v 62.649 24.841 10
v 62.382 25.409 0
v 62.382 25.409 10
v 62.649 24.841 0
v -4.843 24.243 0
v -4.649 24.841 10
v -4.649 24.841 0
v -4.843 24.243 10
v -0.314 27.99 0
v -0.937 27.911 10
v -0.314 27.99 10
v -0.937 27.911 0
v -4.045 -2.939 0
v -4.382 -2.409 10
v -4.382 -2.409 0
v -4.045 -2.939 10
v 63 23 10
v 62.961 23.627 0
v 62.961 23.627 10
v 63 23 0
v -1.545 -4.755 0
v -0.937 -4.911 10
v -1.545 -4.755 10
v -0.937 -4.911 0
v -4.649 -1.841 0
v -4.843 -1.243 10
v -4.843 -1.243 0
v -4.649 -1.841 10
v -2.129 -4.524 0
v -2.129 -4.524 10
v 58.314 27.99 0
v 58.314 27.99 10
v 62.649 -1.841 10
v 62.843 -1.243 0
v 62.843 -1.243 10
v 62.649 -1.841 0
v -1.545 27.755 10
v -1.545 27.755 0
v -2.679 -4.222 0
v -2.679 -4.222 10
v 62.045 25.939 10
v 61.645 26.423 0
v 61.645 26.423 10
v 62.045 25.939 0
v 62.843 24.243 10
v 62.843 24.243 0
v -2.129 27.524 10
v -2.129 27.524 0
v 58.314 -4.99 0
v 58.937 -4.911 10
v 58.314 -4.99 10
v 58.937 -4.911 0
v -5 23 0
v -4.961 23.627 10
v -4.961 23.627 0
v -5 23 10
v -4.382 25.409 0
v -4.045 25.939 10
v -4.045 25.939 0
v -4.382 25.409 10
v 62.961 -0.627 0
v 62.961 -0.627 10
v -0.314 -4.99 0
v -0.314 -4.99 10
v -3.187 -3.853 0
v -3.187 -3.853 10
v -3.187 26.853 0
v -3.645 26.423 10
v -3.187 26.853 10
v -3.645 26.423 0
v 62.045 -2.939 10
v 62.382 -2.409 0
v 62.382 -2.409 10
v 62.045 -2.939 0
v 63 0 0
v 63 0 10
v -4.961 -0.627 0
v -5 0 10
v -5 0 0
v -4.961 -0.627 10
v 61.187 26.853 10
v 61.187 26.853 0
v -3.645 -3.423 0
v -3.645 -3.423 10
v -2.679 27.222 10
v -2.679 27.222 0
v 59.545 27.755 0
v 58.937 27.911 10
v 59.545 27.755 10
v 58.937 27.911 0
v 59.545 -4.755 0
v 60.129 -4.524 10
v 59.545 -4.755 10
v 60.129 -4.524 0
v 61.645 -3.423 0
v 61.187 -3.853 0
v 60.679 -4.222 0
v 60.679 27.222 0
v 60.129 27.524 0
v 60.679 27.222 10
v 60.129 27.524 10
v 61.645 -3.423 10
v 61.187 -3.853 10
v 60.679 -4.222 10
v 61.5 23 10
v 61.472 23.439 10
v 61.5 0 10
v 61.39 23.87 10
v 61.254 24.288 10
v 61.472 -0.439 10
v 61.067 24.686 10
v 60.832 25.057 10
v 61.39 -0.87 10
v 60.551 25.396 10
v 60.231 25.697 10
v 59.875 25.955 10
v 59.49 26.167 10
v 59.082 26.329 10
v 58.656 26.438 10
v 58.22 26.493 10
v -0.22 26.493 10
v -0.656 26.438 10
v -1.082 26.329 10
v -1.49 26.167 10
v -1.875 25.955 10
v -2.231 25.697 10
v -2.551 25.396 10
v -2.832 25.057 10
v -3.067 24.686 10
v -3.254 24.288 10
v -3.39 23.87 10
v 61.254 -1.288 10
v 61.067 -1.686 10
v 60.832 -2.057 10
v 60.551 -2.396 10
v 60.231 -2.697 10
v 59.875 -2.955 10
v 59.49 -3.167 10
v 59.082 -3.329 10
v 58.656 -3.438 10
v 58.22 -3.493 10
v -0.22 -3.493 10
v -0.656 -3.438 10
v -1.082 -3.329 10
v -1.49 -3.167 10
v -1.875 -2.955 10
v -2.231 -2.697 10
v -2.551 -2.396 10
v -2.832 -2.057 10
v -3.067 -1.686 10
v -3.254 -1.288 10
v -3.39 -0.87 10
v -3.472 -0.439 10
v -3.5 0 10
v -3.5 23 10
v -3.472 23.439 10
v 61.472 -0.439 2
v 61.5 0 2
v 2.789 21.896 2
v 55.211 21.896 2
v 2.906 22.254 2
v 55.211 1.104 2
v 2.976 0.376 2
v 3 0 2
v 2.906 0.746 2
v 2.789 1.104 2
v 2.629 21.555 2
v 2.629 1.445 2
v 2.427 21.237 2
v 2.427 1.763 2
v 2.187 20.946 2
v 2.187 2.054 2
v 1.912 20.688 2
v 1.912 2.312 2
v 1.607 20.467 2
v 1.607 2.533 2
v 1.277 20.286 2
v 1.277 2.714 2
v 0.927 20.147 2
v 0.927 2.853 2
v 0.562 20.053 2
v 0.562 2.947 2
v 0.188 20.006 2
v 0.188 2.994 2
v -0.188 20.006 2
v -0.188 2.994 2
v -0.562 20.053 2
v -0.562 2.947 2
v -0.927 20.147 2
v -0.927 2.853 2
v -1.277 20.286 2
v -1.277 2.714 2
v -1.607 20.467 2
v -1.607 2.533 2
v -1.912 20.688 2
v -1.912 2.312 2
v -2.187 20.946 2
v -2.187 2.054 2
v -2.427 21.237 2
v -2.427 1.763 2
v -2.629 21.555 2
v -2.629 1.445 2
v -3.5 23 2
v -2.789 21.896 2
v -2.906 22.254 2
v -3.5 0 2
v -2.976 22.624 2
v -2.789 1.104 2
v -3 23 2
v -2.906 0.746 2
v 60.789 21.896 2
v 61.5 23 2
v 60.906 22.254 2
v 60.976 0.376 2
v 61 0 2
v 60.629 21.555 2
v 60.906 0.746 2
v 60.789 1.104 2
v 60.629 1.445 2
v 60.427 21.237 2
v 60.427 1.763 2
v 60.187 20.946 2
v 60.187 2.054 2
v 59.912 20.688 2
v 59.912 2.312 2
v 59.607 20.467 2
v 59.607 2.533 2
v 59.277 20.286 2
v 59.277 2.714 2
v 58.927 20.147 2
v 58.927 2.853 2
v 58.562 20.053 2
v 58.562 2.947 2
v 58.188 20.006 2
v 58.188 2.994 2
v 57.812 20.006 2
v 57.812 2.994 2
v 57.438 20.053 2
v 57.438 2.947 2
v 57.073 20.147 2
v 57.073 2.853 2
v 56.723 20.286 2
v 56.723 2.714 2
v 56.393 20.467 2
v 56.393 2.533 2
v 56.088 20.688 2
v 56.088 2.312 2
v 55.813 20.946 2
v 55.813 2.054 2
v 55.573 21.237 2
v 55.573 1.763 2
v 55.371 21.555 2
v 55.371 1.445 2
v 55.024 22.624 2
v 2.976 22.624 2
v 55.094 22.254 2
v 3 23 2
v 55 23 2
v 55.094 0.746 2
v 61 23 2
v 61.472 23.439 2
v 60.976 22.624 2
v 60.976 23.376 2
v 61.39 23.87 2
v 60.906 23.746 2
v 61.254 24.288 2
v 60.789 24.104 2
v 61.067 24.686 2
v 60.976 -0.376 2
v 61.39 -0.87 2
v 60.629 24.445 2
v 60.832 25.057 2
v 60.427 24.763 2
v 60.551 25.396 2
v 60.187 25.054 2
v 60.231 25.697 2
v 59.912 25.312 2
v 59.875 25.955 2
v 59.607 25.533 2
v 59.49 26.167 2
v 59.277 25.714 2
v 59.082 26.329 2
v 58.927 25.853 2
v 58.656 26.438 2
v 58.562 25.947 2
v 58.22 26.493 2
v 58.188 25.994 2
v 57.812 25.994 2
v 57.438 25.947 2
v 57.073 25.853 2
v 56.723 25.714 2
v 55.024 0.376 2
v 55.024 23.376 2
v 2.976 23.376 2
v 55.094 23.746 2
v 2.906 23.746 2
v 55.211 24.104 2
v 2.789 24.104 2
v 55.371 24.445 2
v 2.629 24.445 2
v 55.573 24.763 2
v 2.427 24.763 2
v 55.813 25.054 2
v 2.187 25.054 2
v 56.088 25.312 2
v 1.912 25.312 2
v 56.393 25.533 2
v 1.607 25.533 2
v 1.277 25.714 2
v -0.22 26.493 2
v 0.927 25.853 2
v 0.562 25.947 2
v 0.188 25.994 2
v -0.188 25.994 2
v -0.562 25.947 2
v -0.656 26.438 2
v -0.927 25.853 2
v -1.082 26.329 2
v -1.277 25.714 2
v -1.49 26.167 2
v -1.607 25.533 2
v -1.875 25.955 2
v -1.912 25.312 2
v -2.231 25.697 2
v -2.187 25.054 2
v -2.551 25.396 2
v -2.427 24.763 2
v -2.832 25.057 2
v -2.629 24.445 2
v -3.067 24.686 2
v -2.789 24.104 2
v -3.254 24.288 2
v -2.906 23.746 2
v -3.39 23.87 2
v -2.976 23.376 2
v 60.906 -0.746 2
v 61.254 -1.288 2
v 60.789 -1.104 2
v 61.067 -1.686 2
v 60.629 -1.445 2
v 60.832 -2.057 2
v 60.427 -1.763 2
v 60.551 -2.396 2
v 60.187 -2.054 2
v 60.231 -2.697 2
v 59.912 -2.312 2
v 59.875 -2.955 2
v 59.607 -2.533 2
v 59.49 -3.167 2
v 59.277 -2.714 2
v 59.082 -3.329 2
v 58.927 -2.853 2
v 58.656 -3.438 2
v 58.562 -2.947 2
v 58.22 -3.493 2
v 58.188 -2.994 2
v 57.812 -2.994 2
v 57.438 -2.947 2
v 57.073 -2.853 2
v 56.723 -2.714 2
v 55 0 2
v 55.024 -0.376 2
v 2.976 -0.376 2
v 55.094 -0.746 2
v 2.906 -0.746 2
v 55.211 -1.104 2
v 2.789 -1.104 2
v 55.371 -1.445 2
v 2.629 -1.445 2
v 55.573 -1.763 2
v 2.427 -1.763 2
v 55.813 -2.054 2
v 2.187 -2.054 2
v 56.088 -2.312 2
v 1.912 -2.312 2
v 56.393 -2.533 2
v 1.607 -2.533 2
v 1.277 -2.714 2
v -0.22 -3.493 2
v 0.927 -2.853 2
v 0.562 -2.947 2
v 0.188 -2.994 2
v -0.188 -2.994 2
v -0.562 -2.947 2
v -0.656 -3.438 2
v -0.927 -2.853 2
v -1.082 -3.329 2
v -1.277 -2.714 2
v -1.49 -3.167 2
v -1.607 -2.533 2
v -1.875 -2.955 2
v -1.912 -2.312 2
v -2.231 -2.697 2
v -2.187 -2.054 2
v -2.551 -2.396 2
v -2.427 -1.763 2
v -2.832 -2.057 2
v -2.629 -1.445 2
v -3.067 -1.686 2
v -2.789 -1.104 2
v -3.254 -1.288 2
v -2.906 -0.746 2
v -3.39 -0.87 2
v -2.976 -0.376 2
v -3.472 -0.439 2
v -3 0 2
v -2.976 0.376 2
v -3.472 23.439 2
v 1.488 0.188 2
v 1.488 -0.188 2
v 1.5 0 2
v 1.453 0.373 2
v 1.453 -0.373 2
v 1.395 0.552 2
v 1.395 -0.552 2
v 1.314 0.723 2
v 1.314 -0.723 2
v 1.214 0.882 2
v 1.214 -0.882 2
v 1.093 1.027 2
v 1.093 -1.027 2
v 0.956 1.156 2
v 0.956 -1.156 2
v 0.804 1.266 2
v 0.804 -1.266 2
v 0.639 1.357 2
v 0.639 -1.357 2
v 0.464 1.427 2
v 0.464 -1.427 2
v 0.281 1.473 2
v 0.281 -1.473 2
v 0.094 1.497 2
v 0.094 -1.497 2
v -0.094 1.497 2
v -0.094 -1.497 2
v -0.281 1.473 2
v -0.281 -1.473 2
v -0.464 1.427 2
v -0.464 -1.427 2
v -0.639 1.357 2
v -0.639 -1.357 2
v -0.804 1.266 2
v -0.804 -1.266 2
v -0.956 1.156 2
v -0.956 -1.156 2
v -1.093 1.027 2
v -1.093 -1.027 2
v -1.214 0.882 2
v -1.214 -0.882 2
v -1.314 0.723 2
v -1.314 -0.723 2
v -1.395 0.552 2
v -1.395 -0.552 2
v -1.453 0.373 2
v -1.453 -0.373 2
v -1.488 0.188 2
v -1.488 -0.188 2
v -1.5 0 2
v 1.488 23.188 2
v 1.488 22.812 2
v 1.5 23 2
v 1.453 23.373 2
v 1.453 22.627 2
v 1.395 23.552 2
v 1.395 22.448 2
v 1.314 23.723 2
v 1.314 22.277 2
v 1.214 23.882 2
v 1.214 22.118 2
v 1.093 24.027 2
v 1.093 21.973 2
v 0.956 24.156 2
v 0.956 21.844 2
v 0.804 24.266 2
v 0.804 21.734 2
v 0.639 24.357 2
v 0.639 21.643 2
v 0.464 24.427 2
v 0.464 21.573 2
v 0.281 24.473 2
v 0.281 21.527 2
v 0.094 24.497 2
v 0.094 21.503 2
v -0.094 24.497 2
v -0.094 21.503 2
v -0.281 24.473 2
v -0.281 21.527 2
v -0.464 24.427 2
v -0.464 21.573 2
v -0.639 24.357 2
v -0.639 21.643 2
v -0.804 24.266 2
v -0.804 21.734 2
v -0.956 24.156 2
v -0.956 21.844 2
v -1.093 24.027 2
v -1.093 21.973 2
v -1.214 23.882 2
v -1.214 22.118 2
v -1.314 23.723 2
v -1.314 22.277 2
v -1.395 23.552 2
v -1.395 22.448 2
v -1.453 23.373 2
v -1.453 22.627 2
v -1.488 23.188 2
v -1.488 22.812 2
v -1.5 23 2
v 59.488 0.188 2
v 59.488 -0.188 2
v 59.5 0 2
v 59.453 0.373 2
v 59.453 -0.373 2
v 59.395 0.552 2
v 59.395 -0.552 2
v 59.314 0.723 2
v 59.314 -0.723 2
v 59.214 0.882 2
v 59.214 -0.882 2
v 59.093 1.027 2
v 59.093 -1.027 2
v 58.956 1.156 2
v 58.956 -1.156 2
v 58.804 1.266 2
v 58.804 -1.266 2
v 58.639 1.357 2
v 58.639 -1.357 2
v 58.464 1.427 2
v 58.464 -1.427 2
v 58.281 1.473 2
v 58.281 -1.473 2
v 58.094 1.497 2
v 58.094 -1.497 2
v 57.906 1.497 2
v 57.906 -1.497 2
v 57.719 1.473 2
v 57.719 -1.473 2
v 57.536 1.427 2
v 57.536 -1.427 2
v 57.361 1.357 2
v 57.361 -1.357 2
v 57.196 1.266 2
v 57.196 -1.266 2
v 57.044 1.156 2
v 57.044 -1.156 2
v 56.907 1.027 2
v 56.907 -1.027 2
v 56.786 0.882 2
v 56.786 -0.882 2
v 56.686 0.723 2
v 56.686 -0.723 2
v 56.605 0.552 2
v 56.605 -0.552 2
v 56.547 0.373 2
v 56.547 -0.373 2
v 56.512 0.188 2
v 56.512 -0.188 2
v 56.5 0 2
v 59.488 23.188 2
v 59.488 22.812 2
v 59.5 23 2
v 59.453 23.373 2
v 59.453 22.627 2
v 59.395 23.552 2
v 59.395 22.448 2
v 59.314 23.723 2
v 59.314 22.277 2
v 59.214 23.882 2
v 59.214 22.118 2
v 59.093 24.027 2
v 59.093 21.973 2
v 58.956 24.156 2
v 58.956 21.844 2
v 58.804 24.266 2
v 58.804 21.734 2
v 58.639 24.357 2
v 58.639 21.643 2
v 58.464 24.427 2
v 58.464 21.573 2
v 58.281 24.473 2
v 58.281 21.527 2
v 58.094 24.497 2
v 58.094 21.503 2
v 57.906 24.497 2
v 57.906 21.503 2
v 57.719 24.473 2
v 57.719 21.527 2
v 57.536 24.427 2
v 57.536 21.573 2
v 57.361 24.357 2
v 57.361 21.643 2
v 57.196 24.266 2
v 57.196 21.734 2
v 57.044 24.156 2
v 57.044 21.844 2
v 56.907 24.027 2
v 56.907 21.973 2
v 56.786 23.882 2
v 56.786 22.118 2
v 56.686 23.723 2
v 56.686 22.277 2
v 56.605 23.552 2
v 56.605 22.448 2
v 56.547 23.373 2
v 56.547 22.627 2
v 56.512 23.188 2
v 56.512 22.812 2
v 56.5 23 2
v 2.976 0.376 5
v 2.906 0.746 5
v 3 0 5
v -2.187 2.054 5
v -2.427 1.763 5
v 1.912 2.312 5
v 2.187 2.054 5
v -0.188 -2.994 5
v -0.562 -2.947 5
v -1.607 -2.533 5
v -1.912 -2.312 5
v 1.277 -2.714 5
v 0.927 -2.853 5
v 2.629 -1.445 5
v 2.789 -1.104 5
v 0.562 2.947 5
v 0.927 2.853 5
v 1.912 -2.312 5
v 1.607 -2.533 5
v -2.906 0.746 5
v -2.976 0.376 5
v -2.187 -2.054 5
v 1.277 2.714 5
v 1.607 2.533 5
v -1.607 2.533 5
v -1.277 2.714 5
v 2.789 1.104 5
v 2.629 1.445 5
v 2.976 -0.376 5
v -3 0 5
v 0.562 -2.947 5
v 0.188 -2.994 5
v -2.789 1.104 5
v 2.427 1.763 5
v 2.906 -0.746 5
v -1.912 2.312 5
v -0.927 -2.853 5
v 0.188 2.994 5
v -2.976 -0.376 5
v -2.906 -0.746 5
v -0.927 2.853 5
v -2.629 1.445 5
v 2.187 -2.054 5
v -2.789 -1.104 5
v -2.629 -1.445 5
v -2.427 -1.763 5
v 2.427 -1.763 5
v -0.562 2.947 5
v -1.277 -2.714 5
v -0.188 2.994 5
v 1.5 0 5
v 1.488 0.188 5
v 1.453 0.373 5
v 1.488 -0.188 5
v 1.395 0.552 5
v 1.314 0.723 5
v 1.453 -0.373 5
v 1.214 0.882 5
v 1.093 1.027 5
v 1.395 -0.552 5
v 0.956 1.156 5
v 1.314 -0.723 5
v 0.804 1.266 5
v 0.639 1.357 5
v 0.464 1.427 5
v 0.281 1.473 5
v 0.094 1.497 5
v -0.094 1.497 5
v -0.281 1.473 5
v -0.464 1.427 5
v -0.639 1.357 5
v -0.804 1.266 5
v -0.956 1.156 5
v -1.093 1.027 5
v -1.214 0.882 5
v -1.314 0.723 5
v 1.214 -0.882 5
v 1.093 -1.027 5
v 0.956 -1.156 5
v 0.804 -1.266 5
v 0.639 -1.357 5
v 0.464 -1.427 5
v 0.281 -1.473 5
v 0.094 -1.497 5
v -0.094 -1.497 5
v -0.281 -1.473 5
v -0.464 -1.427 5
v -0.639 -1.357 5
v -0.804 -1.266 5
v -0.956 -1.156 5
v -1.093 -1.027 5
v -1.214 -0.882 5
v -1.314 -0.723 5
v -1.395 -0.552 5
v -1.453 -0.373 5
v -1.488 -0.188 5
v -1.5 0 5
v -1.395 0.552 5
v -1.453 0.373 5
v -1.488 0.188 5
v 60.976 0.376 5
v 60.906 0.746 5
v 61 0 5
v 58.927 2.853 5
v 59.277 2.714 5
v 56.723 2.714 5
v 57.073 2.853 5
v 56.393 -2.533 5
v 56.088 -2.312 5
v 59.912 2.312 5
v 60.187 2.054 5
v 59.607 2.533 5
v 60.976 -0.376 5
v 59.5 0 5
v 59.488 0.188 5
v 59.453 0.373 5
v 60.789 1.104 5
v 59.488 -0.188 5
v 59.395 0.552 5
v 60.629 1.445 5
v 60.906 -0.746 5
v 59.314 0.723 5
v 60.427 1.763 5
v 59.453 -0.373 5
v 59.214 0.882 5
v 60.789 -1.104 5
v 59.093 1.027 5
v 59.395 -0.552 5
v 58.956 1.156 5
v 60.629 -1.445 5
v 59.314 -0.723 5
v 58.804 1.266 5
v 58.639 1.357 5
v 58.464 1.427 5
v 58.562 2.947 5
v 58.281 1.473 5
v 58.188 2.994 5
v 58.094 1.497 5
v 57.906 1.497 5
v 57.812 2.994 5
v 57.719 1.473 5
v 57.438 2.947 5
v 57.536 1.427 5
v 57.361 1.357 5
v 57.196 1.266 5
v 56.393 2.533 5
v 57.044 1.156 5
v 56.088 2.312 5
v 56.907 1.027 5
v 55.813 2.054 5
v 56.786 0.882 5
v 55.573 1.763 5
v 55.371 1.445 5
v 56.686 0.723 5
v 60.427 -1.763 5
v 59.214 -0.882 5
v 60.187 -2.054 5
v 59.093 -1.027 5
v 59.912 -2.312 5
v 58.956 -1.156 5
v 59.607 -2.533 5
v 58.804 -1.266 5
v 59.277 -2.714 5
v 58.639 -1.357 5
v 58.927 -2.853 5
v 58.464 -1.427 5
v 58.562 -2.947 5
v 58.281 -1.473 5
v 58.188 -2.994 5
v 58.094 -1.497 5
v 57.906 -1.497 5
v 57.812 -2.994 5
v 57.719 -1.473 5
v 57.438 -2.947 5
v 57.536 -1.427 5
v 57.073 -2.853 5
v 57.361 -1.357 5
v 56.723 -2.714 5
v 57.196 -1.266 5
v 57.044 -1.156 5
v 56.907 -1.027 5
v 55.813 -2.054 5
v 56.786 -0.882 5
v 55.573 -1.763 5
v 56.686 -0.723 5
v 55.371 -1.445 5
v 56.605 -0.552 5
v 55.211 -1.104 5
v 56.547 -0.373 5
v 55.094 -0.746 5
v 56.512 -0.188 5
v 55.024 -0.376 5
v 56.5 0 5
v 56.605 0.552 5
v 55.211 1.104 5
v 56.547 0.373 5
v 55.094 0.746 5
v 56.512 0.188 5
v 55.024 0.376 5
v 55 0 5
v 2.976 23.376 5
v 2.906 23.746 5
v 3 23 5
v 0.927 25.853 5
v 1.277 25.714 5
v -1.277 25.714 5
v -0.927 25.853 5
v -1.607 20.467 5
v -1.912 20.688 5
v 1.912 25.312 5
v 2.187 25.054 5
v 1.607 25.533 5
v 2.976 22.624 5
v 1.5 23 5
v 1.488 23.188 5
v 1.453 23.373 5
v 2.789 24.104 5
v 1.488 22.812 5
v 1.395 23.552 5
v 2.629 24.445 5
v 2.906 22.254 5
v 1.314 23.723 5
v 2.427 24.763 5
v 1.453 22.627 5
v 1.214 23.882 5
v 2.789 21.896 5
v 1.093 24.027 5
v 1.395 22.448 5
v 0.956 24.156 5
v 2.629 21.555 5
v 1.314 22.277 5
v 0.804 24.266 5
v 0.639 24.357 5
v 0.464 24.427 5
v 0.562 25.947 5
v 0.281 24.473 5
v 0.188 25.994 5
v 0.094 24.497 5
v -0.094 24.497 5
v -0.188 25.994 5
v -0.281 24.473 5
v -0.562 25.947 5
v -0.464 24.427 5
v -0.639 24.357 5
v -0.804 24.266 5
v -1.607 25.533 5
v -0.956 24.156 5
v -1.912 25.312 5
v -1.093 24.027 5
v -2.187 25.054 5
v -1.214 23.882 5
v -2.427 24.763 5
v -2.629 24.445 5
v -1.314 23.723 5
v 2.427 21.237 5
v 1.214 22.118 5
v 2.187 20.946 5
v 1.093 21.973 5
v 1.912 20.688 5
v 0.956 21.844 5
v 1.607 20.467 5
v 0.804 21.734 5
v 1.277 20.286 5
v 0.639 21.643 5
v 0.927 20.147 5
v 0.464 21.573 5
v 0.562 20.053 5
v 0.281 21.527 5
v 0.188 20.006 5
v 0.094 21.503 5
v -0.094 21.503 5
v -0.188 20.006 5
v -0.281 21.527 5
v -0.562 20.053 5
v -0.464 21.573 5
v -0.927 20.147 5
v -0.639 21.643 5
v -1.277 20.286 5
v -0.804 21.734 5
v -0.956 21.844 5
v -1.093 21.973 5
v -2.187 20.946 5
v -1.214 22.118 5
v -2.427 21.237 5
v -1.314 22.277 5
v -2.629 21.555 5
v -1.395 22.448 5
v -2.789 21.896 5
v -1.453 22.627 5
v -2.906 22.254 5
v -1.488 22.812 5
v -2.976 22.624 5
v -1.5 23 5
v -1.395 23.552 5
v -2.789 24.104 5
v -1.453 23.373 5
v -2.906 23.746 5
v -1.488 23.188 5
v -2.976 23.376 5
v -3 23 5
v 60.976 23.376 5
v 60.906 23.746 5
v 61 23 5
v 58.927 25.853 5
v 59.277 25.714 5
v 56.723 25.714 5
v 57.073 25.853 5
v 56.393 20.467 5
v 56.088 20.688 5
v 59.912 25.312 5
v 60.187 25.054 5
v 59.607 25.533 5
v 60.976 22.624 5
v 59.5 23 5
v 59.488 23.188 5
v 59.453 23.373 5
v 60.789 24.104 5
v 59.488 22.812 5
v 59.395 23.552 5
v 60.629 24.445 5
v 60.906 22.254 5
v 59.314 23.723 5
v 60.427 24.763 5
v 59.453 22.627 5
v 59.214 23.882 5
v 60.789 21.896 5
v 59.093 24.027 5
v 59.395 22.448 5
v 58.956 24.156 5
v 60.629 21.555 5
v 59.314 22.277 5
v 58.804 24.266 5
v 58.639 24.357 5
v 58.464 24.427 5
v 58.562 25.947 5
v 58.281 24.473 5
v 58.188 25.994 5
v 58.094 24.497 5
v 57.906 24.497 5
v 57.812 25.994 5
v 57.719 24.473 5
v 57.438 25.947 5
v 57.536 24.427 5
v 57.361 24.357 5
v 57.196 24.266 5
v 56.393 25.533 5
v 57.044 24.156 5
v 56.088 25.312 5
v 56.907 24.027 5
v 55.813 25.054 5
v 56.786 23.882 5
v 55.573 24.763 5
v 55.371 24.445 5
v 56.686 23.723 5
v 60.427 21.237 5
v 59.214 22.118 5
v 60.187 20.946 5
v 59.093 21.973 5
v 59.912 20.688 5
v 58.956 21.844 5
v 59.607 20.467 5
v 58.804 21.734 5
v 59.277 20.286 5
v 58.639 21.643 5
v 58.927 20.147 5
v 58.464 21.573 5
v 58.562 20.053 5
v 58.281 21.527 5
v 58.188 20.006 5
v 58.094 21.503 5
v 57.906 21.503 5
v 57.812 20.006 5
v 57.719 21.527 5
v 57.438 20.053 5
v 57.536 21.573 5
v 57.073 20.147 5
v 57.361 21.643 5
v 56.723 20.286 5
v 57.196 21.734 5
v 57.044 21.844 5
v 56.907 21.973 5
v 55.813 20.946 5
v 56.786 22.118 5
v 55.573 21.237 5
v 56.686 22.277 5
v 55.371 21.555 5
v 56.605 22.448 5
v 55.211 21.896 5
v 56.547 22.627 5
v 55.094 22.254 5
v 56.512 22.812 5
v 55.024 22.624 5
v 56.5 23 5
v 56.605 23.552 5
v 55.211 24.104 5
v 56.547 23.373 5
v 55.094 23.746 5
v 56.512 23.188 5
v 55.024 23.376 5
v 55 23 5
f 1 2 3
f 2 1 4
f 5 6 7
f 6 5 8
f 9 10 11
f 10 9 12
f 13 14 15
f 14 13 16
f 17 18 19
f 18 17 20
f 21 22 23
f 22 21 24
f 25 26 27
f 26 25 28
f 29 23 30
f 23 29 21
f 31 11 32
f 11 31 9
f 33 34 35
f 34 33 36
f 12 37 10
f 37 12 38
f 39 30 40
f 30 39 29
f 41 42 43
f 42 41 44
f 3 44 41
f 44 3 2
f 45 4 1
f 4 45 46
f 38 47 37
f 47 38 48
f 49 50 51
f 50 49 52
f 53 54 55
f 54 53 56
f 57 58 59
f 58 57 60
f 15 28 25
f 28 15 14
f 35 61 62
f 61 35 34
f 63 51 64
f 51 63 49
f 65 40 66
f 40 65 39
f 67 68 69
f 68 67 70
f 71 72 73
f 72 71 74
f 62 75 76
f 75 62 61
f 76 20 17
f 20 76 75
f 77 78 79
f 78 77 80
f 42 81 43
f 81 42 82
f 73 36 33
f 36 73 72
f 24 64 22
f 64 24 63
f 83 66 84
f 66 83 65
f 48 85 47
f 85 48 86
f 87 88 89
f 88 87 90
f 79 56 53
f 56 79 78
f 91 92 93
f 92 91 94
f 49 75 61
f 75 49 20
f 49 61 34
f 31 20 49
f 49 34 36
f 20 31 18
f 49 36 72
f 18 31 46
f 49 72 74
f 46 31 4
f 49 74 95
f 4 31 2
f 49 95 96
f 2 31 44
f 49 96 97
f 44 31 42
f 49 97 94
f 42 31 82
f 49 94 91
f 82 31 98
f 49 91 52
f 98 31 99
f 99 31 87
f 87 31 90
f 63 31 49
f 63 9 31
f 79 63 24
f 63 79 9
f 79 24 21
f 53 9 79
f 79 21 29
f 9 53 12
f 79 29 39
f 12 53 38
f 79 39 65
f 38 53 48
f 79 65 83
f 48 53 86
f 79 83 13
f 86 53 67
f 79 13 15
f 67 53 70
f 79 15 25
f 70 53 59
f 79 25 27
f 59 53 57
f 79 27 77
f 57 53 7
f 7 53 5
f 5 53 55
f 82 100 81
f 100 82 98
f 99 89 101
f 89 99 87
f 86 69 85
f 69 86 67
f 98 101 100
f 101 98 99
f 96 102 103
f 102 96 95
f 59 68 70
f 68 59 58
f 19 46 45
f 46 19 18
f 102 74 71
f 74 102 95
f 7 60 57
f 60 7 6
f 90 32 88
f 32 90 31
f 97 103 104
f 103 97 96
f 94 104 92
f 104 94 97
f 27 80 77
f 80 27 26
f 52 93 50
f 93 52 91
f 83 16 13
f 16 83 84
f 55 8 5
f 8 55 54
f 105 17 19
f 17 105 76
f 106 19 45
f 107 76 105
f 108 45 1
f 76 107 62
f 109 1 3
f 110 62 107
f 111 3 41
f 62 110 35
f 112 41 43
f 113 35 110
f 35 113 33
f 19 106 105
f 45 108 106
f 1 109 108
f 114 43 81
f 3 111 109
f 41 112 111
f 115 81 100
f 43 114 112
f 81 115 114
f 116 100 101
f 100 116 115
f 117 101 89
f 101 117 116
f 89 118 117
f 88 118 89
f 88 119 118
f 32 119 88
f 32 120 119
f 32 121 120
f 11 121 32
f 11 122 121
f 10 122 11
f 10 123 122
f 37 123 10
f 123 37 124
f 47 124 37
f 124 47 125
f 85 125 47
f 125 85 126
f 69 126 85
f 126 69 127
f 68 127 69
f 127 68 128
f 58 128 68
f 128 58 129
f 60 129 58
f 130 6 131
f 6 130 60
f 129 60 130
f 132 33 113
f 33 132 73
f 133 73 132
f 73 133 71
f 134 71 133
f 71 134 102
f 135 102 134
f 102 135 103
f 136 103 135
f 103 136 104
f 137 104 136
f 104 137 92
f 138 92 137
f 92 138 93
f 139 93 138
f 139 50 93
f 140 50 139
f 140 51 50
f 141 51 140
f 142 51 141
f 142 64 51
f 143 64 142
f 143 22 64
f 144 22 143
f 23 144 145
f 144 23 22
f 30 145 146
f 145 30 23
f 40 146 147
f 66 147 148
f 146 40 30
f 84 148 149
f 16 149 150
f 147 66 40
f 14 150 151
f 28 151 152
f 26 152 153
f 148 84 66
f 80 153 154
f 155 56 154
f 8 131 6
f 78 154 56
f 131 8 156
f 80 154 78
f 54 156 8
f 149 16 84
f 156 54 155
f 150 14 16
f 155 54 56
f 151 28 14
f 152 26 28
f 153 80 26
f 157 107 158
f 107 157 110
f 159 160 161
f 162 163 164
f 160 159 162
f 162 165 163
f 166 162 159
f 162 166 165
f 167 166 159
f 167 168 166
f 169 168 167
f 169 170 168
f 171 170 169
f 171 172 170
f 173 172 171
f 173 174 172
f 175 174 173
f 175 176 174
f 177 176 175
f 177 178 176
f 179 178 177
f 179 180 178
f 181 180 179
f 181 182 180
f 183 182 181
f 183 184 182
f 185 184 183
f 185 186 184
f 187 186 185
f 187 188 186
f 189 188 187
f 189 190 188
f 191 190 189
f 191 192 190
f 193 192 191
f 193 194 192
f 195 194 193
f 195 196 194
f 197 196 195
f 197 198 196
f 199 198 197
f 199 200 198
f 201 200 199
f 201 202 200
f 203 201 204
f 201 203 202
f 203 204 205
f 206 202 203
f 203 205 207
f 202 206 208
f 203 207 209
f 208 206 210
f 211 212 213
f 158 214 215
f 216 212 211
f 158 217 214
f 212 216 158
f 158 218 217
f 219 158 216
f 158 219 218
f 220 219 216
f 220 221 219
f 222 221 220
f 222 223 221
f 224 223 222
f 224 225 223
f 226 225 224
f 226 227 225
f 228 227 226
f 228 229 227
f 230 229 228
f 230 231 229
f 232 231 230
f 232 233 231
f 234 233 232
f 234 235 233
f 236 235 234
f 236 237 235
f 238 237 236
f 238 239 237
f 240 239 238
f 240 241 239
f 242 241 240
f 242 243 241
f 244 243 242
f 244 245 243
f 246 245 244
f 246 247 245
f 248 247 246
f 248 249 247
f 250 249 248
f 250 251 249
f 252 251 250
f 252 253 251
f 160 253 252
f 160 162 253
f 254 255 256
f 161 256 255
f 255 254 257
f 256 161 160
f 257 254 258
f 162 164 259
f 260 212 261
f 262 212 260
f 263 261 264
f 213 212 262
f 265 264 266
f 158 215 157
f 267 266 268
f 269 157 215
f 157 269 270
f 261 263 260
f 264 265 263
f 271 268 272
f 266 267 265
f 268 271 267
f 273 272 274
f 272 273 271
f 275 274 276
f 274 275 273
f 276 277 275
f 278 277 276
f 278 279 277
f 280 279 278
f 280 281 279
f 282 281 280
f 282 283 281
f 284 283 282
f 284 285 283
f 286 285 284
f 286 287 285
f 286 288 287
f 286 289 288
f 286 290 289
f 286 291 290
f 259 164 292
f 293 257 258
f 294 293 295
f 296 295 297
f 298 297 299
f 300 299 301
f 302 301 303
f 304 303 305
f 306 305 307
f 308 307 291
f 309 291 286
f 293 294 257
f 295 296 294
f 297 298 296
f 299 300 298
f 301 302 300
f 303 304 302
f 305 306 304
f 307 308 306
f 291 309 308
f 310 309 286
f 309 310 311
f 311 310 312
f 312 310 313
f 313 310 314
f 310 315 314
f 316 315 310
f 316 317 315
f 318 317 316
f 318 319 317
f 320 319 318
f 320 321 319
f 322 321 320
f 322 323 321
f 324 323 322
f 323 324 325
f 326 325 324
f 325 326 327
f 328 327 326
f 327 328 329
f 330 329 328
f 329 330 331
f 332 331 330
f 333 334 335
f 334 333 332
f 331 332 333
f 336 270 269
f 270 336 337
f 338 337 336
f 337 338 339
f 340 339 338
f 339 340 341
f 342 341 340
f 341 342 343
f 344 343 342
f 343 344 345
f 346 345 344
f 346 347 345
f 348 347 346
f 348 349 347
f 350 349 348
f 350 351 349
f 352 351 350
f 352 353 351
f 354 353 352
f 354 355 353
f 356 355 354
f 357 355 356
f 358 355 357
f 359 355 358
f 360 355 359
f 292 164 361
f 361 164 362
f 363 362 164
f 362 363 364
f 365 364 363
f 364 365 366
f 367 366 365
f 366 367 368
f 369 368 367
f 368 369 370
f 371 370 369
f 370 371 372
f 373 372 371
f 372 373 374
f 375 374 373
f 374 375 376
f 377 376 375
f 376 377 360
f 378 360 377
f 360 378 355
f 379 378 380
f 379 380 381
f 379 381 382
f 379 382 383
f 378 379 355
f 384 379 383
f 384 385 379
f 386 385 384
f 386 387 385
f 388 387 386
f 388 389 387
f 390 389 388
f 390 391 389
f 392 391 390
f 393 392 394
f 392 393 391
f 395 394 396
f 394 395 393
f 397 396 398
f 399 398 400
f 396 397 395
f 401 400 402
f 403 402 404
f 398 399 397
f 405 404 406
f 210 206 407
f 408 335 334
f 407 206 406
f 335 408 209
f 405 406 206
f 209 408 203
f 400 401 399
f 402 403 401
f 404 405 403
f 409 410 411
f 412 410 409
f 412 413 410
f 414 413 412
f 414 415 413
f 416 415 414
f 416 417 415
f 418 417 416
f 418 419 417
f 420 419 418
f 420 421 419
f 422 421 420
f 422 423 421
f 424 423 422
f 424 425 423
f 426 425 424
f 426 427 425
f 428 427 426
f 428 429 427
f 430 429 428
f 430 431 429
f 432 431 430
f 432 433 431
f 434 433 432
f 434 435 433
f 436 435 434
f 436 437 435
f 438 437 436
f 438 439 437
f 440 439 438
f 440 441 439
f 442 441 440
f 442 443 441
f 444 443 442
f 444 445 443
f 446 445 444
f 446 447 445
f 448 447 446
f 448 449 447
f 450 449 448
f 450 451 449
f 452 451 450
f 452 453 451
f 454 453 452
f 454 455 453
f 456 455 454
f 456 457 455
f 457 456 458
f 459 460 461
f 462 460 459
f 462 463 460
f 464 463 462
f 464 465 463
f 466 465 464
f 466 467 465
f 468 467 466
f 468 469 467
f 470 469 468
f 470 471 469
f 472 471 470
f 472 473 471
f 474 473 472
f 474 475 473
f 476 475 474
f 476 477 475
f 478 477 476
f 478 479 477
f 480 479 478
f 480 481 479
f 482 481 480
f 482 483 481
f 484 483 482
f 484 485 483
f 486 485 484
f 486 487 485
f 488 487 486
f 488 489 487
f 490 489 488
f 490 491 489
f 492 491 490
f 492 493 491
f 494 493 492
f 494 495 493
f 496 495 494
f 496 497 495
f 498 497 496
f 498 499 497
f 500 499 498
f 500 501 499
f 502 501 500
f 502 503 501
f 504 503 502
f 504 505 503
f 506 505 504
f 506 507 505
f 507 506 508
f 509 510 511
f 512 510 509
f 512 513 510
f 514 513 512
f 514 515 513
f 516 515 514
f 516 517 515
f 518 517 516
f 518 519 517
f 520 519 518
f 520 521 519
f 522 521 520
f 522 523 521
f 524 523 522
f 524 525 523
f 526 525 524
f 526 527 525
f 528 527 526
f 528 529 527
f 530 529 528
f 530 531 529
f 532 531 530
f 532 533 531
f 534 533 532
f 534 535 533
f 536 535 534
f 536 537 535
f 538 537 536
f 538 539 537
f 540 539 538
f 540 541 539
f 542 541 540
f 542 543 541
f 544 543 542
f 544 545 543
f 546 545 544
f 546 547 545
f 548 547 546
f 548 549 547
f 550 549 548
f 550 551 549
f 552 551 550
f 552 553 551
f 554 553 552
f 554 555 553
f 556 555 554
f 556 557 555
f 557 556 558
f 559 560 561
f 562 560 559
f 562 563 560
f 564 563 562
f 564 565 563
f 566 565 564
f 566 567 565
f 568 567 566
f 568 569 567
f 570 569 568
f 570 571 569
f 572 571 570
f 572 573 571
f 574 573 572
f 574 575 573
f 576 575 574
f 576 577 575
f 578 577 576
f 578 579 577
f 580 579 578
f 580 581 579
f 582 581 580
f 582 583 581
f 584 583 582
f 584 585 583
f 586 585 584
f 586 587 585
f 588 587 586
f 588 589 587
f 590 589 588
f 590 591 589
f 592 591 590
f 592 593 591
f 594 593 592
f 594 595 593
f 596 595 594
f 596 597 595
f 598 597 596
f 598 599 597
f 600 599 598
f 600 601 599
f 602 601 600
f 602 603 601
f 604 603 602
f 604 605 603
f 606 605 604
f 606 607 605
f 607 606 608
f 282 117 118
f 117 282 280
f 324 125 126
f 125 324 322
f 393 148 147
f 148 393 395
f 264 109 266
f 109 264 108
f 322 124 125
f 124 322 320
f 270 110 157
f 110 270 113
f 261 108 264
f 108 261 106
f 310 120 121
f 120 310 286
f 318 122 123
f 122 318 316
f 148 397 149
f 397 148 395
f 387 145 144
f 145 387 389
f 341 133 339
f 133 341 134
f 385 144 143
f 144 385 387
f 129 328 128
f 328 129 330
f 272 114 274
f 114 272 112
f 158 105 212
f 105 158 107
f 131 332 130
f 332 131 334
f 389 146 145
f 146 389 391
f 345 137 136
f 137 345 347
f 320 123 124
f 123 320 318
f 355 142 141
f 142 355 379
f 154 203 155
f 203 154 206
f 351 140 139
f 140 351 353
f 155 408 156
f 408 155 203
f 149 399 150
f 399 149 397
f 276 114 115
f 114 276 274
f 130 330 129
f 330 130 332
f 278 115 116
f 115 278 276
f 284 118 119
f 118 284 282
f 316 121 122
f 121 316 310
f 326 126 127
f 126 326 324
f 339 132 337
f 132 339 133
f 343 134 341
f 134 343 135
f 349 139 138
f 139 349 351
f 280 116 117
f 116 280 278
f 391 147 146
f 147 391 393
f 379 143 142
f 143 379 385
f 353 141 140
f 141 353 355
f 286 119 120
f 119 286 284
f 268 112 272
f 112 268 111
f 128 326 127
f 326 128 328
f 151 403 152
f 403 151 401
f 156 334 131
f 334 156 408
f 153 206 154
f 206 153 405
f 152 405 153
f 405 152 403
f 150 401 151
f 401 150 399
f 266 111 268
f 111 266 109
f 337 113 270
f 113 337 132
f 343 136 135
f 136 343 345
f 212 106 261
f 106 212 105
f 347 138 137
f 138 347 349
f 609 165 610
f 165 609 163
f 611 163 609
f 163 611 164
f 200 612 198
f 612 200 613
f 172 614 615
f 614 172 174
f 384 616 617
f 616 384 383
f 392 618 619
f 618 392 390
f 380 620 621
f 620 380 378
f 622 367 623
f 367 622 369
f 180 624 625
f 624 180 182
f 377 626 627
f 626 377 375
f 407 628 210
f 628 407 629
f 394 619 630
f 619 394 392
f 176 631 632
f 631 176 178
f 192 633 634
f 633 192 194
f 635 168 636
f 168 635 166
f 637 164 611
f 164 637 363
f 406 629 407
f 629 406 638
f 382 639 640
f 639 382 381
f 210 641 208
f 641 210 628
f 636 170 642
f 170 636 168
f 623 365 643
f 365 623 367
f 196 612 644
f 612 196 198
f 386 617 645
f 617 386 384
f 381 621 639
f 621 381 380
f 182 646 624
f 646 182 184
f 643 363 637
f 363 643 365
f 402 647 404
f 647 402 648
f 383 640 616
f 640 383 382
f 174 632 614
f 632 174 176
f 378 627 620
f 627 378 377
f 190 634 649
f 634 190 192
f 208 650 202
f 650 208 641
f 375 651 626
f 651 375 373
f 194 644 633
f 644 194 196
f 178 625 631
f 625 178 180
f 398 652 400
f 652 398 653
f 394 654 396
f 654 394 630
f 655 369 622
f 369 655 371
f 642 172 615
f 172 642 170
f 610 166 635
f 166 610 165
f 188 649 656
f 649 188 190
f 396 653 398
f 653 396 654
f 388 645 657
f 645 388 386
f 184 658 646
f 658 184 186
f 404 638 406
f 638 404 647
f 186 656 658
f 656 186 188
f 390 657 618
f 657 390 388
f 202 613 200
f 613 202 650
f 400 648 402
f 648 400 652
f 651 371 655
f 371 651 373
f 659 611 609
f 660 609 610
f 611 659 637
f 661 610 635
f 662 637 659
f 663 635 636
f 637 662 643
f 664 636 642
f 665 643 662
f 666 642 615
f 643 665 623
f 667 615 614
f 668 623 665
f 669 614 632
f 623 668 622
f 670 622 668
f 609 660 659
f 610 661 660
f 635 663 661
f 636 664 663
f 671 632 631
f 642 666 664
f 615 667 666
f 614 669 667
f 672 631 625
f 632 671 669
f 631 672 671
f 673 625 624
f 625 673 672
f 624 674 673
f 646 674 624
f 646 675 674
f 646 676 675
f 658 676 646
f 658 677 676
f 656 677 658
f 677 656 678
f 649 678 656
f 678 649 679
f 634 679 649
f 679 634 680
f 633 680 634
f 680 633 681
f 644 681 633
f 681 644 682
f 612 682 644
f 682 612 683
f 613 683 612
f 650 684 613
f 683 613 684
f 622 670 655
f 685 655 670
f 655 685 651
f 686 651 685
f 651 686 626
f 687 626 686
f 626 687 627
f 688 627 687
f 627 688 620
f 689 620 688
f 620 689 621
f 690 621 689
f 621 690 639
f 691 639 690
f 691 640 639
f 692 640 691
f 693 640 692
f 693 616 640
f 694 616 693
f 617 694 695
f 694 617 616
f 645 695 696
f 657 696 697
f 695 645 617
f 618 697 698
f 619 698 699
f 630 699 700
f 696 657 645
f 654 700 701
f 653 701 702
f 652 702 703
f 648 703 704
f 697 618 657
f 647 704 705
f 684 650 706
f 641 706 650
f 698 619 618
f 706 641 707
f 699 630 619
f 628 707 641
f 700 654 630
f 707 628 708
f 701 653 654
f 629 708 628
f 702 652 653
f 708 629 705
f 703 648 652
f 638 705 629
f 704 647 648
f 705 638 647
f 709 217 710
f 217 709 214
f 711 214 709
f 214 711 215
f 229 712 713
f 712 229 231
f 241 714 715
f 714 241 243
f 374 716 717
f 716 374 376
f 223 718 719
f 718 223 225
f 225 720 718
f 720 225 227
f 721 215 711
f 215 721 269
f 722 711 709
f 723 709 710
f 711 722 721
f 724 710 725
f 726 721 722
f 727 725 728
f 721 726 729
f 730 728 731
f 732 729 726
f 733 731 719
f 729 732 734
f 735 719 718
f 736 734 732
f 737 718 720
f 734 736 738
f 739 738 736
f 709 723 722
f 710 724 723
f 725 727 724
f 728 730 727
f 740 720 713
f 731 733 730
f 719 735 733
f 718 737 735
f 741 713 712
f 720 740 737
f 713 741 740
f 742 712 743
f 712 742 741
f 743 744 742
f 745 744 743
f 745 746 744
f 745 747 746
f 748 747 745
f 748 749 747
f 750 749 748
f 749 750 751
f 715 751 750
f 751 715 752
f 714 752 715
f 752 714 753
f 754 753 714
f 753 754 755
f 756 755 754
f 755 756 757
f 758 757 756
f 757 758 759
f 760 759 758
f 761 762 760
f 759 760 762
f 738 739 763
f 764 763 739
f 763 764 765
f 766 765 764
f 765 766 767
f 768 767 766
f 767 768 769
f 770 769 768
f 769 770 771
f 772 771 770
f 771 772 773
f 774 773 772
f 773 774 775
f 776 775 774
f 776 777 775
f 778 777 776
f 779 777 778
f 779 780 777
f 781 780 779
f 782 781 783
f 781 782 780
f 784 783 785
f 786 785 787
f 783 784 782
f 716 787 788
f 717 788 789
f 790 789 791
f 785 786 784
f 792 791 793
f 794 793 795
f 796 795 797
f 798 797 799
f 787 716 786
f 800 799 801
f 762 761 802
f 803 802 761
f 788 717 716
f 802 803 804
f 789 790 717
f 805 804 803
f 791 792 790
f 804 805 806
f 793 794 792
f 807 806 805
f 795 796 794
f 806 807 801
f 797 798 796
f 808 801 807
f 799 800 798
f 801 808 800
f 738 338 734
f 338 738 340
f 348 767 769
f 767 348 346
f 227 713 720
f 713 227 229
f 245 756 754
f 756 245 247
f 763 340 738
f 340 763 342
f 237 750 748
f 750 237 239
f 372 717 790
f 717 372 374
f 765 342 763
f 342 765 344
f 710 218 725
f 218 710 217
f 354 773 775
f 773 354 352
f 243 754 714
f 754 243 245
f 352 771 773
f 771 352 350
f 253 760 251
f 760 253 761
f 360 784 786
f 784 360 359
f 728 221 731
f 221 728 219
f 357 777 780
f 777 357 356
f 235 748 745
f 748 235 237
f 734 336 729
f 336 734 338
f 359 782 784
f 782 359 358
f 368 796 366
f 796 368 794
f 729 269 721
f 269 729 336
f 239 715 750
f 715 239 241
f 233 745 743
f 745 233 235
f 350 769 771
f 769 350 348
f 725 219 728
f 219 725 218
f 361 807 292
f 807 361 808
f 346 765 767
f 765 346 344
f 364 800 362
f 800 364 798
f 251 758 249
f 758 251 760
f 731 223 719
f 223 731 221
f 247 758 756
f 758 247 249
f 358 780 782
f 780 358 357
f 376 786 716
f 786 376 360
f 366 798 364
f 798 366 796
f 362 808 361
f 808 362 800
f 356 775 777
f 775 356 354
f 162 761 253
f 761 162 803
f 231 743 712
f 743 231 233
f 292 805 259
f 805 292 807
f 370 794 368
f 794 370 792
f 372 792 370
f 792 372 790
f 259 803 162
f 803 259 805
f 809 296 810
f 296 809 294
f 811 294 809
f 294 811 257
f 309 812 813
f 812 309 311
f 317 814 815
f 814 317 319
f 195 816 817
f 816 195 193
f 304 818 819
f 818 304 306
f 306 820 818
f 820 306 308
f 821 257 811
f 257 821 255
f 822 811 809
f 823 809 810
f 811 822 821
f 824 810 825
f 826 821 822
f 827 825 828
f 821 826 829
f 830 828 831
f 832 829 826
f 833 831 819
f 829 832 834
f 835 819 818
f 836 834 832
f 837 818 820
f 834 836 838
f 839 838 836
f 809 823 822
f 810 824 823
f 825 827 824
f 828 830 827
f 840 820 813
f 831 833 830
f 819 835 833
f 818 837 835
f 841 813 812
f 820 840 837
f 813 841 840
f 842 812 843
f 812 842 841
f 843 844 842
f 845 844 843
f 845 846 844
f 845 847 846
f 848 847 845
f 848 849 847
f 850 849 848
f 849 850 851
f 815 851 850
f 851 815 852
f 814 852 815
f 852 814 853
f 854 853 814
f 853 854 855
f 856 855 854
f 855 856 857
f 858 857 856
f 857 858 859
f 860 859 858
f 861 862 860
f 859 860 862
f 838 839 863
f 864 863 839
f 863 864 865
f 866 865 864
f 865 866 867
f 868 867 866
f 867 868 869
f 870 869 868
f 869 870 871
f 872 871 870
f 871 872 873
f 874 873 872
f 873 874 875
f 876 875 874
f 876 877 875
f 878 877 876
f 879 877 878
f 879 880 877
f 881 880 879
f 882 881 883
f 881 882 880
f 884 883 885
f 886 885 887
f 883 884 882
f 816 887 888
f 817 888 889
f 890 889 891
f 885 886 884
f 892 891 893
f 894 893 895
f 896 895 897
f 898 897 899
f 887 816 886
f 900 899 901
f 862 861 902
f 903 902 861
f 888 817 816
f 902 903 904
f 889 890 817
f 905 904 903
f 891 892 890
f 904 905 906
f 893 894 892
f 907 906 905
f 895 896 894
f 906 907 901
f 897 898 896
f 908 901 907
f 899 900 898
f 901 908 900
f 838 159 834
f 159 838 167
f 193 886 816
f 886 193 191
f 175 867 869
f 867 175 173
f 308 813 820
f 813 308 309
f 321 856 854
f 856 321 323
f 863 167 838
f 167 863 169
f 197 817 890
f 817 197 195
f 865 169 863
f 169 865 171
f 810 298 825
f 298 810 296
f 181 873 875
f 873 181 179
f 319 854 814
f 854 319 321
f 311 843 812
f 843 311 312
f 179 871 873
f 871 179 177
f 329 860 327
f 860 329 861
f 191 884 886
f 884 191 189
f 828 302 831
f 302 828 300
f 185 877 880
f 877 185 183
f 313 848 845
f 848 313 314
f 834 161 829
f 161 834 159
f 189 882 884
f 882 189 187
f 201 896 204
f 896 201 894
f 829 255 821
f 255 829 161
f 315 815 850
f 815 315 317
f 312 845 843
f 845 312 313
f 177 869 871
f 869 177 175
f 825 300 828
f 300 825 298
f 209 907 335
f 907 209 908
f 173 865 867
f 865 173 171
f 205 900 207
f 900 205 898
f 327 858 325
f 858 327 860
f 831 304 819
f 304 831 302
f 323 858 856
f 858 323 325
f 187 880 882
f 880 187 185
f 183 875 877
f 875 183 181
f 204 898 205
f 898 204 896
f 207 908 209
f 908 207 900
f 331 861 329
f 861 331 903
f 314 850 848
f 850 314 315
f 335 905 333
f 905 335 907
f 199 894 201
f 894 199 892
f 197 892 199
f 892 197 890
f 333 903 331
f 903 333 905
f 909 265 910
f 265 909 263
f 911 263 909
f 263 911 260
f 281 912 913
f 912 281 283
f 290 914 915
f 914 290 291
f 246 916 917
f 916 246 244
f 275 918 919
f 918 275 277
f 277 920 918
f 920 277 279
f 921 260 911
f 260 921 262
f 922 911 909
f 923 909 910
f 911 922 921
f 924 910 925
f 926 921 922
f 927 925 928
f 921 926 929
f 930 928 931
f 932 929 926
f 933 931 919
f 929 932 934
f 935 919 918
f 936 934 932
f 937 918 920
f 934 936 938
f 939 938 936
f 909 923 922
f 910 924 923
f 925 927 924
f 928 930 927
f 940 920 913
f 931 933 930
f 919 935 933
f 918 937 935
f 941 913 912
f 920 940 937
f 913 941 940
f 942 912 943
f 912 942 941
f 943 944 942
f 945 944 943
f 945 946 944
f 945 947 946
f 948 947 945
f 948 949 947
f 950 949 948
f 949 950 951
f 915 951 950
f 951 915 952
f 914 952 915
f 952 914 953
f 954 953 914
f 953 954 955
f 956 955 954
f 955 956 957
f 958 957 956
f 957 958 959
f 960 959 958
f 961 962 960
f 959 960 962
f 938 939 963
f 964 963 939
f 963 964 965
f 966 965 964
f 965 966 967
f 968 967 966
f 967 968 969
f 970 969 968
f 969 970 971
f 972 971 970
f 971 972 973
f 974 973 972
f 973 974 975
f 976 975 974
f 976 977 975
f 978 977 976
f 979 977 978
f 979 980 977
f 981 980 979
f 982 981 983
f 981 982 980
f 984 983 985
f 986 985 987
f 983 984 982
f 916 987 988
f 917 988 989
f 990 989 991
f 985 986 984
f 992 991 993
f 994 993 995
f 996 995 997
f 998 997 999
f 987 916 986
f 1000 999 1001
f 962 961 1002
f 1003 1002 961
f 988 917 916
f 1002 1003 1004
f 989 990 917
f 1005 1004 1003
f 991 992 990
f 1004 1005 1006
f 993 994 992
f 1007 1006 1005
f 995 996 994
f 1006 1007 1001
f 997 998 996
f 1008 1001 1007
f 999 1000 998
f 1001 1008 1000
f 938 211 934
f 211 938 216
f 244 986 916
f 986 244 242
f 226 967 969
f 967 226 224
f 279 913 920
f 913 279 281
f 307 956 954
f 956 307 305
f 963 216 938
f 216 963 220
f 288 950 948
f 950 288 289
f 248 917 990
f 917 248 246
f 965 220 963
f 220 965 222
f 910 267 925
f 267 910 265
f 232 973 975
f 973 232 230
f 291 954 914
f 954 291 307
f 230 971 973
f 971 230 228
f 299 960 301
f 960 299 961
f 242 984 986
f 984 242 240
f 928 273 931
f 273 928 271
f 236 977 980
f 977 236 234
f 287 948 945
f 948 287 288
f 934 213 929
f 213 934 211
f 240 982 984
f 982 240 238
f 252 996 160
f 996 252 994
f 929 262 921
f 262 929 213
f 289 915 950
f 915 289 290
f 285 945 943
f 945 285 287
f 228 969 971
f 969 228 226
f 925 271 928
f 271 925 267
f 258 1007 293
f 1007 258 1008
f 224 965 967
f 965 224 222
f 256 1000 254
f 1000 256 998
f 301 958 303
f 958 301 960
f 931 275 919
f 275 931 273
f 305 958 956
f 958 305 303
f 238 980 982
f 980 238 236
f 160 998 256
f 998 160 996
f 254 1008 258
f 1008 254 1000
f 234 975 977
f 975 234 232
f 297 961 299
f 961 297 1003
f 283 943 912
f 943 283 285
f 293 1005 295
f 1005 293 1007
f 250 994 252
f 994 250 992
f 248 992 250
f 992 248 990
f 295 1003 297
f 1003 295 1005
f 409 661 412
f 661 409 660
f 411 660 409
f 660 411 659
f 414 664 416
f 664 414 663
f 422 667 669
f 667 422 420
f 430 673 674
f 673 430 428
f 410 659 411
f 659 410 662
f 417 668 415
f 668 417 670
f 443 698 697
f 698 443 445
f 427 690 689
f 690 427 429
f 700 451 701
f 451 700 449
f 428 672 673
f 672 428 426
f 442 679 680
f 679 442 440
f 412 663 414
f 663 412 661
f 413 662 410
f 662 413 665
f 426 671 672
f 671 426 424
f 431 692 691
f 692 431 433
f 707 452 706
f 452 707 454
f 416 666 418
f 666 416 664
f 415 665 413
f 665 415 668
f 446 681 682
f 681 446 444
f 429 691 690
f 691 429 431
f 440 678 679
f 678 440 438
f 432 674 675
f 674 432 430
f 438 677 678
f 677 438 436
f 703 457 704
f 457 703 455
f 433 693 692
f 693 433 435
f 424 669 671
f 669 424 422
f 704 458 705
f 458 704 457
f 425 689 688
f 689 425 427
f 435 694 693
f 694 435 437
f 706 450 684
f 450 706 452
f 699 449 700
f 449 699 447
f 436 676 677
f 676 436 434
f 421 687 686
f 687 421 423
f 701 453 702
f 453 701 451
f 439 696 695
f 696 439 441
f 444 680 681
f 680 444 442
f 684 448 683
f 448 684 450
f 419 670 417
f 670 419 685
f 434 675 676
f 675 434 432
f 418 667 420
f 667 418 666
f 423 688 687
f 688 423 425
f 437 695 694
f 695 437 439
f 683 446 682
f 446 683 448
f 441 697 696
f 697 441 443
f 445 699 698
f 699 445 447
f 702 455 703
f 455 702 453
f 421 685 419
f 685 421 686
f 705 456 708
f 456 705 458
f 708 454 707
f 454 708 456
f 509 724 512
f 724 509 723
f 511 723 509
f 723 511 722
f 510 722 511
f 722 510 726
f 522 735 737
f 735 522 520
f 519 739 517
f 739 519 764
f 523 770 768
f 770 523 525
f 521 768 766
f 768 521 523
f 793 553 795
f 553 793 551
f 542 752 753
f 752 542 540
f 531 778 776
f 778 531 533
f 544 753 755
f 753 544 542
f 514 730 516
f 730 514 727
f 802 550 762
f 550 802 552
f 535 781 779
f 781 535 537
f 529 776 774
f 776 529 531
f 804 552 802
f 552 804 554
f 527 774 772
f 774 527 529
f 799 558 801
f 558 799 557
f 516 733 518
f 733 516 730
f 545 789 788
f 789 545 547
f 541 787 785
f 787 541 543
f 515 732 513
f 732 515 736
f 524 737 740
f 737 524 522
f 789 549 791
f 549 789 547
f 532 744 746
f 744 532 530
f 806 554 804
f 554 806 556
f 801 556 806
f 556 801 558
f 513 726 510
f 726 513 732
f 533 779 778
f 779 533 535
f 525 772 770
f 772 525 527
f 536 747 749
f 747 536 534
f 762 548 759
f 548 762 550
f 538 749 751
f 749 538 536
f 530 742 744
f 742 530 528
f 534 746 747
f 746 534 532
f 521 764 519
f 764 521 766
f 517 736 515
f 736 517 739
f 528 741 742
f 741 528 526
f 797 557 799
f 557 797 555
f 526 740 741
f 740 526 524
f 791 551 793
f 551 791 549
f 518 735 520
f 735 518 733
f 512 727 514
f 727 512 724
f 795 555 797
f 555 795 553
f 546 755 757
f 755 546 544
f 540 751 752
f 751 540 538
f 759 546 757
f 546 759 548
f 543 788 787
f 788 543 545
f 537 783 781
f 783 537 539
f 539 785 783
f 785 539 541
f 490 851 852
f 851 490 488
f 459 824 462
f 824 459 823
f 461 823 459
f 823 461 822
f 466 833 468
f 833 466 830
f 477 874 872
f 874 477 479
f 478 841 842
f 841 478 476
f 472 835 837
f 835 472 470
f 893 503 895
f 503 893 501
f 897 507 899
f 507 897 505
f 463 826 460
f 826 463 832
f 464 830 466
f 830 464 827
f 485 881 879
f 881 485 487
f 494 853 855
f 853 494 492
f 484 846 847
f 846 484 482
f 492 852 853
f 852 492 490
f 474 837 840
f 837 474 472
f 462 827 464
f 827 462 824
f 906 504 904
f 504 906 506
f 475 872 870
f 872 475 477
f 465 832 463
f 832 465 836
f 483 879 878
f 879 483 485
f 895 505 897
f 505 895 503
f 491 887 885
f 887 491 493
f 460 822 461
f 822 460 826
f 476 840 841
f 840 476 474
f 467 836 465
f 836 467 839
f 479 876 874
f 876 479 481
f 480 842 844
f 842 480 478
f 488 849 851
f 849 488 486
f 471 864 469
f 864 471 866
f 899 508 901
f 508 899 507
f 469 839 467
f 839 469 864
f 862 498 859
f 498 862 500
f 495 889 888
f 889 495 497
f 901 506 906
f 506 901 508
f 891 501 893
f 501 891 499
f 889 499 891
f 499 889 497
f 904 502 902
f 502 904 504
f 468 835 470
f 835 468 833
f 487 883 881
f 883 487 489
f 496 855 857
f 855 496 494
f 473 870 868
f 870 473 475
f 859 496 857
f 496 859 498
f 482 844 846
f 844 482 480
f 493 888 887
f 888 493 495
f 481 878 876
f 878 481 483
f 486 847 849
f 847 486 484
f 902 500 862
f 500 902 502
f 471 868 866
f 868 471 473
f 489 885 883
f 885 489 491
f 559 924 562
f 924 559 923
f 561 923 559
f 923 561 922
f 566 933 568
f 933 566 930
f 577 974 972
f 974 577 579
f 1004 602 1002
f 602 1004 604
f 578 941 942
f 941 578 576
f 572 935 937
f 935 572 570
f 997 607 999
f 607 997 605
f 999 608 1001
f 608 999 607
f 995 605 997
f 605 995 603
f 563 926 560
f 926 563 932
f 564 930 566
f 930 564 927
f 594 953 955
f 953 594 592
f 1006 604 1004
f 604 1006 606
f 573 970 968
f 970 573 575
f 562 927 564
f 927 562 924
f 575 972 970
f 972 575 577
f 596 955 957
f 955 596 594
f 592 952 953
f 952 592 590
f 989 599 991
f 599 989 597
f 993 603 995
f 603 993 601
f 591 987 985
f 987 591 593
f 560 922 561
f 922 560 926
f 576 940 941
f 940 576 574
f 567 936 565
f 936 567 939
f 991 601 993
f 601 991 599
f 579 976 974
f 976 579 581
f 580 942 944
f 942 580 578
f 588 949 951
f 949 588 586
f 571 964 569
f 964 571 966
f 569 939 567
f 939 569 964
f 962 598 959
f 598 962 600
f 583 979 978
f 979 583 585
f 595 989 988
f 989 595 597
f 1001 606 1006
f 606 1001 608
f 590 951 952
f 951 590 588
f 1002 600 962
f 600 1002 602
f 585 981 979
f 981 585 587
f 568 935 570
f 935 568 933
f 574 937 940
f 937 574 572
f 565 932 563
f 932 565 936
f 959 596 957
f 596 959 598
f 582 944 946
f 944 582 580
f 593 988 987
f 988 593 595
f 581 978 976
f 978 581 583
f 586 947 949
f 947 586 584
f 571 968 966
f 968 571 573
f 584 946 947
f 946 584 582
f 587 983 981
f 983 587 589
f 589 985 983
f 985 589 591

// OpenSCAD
rpi_x=58;
rpi_y=23;
$fn=50;

module box_bottom(){
    union(){
        difference(){
            base();
            translate([0,0,2])rpi();
        }
        standoffs();
    }
}

box_bottom();


module rpi(){
    hull(){
        cylinder(r=3.5,h=10);
        translate([rpi_x,0,0])cylinder(r=3.5,h=10);
        translate([0,rpi_y,0])cylinder(r=3.5,h=10);
        translate([rpi_x,rpi_y,0])cylinder(r=3.5,h=10);    
    }
}
    
//rpi();

module base(){
    hull(){
        cylinder(r=5,h=10);
        translate([rpi_x,0,0])cylinder(r=5,h=10);
        translate([0,rpi_y,0])cylinder(r=5,h=10);
        translate([rpi_x,rpi_y,0])cylinder(r=5,h=10);    
    }
}

//base();



module standoffs(){
    difference(){
        union(){
            cylinder(r=3,h=5);
            translate([rpi_x,0,0])cylinder(r=3,h=5);
            translate([0,rpi_y,0])cylinder(r=3,h=5);
            translate([rpi_x,rpi_y,0])cylinder(r=3,h=5);   
        }
        translate([0,0,2])union(){
            cylinder(r=1.5,h=5);
            translate([rpi_x,0,0])cylinder(r=1.5,h=5);
            translate([0,rpi_y,0])cylinder(r=1.5,h=5);
            translate([rpi_x,rpi_y,0])cylinder(r=1.5,h=5);
        }
    }
}
//standoffs();
